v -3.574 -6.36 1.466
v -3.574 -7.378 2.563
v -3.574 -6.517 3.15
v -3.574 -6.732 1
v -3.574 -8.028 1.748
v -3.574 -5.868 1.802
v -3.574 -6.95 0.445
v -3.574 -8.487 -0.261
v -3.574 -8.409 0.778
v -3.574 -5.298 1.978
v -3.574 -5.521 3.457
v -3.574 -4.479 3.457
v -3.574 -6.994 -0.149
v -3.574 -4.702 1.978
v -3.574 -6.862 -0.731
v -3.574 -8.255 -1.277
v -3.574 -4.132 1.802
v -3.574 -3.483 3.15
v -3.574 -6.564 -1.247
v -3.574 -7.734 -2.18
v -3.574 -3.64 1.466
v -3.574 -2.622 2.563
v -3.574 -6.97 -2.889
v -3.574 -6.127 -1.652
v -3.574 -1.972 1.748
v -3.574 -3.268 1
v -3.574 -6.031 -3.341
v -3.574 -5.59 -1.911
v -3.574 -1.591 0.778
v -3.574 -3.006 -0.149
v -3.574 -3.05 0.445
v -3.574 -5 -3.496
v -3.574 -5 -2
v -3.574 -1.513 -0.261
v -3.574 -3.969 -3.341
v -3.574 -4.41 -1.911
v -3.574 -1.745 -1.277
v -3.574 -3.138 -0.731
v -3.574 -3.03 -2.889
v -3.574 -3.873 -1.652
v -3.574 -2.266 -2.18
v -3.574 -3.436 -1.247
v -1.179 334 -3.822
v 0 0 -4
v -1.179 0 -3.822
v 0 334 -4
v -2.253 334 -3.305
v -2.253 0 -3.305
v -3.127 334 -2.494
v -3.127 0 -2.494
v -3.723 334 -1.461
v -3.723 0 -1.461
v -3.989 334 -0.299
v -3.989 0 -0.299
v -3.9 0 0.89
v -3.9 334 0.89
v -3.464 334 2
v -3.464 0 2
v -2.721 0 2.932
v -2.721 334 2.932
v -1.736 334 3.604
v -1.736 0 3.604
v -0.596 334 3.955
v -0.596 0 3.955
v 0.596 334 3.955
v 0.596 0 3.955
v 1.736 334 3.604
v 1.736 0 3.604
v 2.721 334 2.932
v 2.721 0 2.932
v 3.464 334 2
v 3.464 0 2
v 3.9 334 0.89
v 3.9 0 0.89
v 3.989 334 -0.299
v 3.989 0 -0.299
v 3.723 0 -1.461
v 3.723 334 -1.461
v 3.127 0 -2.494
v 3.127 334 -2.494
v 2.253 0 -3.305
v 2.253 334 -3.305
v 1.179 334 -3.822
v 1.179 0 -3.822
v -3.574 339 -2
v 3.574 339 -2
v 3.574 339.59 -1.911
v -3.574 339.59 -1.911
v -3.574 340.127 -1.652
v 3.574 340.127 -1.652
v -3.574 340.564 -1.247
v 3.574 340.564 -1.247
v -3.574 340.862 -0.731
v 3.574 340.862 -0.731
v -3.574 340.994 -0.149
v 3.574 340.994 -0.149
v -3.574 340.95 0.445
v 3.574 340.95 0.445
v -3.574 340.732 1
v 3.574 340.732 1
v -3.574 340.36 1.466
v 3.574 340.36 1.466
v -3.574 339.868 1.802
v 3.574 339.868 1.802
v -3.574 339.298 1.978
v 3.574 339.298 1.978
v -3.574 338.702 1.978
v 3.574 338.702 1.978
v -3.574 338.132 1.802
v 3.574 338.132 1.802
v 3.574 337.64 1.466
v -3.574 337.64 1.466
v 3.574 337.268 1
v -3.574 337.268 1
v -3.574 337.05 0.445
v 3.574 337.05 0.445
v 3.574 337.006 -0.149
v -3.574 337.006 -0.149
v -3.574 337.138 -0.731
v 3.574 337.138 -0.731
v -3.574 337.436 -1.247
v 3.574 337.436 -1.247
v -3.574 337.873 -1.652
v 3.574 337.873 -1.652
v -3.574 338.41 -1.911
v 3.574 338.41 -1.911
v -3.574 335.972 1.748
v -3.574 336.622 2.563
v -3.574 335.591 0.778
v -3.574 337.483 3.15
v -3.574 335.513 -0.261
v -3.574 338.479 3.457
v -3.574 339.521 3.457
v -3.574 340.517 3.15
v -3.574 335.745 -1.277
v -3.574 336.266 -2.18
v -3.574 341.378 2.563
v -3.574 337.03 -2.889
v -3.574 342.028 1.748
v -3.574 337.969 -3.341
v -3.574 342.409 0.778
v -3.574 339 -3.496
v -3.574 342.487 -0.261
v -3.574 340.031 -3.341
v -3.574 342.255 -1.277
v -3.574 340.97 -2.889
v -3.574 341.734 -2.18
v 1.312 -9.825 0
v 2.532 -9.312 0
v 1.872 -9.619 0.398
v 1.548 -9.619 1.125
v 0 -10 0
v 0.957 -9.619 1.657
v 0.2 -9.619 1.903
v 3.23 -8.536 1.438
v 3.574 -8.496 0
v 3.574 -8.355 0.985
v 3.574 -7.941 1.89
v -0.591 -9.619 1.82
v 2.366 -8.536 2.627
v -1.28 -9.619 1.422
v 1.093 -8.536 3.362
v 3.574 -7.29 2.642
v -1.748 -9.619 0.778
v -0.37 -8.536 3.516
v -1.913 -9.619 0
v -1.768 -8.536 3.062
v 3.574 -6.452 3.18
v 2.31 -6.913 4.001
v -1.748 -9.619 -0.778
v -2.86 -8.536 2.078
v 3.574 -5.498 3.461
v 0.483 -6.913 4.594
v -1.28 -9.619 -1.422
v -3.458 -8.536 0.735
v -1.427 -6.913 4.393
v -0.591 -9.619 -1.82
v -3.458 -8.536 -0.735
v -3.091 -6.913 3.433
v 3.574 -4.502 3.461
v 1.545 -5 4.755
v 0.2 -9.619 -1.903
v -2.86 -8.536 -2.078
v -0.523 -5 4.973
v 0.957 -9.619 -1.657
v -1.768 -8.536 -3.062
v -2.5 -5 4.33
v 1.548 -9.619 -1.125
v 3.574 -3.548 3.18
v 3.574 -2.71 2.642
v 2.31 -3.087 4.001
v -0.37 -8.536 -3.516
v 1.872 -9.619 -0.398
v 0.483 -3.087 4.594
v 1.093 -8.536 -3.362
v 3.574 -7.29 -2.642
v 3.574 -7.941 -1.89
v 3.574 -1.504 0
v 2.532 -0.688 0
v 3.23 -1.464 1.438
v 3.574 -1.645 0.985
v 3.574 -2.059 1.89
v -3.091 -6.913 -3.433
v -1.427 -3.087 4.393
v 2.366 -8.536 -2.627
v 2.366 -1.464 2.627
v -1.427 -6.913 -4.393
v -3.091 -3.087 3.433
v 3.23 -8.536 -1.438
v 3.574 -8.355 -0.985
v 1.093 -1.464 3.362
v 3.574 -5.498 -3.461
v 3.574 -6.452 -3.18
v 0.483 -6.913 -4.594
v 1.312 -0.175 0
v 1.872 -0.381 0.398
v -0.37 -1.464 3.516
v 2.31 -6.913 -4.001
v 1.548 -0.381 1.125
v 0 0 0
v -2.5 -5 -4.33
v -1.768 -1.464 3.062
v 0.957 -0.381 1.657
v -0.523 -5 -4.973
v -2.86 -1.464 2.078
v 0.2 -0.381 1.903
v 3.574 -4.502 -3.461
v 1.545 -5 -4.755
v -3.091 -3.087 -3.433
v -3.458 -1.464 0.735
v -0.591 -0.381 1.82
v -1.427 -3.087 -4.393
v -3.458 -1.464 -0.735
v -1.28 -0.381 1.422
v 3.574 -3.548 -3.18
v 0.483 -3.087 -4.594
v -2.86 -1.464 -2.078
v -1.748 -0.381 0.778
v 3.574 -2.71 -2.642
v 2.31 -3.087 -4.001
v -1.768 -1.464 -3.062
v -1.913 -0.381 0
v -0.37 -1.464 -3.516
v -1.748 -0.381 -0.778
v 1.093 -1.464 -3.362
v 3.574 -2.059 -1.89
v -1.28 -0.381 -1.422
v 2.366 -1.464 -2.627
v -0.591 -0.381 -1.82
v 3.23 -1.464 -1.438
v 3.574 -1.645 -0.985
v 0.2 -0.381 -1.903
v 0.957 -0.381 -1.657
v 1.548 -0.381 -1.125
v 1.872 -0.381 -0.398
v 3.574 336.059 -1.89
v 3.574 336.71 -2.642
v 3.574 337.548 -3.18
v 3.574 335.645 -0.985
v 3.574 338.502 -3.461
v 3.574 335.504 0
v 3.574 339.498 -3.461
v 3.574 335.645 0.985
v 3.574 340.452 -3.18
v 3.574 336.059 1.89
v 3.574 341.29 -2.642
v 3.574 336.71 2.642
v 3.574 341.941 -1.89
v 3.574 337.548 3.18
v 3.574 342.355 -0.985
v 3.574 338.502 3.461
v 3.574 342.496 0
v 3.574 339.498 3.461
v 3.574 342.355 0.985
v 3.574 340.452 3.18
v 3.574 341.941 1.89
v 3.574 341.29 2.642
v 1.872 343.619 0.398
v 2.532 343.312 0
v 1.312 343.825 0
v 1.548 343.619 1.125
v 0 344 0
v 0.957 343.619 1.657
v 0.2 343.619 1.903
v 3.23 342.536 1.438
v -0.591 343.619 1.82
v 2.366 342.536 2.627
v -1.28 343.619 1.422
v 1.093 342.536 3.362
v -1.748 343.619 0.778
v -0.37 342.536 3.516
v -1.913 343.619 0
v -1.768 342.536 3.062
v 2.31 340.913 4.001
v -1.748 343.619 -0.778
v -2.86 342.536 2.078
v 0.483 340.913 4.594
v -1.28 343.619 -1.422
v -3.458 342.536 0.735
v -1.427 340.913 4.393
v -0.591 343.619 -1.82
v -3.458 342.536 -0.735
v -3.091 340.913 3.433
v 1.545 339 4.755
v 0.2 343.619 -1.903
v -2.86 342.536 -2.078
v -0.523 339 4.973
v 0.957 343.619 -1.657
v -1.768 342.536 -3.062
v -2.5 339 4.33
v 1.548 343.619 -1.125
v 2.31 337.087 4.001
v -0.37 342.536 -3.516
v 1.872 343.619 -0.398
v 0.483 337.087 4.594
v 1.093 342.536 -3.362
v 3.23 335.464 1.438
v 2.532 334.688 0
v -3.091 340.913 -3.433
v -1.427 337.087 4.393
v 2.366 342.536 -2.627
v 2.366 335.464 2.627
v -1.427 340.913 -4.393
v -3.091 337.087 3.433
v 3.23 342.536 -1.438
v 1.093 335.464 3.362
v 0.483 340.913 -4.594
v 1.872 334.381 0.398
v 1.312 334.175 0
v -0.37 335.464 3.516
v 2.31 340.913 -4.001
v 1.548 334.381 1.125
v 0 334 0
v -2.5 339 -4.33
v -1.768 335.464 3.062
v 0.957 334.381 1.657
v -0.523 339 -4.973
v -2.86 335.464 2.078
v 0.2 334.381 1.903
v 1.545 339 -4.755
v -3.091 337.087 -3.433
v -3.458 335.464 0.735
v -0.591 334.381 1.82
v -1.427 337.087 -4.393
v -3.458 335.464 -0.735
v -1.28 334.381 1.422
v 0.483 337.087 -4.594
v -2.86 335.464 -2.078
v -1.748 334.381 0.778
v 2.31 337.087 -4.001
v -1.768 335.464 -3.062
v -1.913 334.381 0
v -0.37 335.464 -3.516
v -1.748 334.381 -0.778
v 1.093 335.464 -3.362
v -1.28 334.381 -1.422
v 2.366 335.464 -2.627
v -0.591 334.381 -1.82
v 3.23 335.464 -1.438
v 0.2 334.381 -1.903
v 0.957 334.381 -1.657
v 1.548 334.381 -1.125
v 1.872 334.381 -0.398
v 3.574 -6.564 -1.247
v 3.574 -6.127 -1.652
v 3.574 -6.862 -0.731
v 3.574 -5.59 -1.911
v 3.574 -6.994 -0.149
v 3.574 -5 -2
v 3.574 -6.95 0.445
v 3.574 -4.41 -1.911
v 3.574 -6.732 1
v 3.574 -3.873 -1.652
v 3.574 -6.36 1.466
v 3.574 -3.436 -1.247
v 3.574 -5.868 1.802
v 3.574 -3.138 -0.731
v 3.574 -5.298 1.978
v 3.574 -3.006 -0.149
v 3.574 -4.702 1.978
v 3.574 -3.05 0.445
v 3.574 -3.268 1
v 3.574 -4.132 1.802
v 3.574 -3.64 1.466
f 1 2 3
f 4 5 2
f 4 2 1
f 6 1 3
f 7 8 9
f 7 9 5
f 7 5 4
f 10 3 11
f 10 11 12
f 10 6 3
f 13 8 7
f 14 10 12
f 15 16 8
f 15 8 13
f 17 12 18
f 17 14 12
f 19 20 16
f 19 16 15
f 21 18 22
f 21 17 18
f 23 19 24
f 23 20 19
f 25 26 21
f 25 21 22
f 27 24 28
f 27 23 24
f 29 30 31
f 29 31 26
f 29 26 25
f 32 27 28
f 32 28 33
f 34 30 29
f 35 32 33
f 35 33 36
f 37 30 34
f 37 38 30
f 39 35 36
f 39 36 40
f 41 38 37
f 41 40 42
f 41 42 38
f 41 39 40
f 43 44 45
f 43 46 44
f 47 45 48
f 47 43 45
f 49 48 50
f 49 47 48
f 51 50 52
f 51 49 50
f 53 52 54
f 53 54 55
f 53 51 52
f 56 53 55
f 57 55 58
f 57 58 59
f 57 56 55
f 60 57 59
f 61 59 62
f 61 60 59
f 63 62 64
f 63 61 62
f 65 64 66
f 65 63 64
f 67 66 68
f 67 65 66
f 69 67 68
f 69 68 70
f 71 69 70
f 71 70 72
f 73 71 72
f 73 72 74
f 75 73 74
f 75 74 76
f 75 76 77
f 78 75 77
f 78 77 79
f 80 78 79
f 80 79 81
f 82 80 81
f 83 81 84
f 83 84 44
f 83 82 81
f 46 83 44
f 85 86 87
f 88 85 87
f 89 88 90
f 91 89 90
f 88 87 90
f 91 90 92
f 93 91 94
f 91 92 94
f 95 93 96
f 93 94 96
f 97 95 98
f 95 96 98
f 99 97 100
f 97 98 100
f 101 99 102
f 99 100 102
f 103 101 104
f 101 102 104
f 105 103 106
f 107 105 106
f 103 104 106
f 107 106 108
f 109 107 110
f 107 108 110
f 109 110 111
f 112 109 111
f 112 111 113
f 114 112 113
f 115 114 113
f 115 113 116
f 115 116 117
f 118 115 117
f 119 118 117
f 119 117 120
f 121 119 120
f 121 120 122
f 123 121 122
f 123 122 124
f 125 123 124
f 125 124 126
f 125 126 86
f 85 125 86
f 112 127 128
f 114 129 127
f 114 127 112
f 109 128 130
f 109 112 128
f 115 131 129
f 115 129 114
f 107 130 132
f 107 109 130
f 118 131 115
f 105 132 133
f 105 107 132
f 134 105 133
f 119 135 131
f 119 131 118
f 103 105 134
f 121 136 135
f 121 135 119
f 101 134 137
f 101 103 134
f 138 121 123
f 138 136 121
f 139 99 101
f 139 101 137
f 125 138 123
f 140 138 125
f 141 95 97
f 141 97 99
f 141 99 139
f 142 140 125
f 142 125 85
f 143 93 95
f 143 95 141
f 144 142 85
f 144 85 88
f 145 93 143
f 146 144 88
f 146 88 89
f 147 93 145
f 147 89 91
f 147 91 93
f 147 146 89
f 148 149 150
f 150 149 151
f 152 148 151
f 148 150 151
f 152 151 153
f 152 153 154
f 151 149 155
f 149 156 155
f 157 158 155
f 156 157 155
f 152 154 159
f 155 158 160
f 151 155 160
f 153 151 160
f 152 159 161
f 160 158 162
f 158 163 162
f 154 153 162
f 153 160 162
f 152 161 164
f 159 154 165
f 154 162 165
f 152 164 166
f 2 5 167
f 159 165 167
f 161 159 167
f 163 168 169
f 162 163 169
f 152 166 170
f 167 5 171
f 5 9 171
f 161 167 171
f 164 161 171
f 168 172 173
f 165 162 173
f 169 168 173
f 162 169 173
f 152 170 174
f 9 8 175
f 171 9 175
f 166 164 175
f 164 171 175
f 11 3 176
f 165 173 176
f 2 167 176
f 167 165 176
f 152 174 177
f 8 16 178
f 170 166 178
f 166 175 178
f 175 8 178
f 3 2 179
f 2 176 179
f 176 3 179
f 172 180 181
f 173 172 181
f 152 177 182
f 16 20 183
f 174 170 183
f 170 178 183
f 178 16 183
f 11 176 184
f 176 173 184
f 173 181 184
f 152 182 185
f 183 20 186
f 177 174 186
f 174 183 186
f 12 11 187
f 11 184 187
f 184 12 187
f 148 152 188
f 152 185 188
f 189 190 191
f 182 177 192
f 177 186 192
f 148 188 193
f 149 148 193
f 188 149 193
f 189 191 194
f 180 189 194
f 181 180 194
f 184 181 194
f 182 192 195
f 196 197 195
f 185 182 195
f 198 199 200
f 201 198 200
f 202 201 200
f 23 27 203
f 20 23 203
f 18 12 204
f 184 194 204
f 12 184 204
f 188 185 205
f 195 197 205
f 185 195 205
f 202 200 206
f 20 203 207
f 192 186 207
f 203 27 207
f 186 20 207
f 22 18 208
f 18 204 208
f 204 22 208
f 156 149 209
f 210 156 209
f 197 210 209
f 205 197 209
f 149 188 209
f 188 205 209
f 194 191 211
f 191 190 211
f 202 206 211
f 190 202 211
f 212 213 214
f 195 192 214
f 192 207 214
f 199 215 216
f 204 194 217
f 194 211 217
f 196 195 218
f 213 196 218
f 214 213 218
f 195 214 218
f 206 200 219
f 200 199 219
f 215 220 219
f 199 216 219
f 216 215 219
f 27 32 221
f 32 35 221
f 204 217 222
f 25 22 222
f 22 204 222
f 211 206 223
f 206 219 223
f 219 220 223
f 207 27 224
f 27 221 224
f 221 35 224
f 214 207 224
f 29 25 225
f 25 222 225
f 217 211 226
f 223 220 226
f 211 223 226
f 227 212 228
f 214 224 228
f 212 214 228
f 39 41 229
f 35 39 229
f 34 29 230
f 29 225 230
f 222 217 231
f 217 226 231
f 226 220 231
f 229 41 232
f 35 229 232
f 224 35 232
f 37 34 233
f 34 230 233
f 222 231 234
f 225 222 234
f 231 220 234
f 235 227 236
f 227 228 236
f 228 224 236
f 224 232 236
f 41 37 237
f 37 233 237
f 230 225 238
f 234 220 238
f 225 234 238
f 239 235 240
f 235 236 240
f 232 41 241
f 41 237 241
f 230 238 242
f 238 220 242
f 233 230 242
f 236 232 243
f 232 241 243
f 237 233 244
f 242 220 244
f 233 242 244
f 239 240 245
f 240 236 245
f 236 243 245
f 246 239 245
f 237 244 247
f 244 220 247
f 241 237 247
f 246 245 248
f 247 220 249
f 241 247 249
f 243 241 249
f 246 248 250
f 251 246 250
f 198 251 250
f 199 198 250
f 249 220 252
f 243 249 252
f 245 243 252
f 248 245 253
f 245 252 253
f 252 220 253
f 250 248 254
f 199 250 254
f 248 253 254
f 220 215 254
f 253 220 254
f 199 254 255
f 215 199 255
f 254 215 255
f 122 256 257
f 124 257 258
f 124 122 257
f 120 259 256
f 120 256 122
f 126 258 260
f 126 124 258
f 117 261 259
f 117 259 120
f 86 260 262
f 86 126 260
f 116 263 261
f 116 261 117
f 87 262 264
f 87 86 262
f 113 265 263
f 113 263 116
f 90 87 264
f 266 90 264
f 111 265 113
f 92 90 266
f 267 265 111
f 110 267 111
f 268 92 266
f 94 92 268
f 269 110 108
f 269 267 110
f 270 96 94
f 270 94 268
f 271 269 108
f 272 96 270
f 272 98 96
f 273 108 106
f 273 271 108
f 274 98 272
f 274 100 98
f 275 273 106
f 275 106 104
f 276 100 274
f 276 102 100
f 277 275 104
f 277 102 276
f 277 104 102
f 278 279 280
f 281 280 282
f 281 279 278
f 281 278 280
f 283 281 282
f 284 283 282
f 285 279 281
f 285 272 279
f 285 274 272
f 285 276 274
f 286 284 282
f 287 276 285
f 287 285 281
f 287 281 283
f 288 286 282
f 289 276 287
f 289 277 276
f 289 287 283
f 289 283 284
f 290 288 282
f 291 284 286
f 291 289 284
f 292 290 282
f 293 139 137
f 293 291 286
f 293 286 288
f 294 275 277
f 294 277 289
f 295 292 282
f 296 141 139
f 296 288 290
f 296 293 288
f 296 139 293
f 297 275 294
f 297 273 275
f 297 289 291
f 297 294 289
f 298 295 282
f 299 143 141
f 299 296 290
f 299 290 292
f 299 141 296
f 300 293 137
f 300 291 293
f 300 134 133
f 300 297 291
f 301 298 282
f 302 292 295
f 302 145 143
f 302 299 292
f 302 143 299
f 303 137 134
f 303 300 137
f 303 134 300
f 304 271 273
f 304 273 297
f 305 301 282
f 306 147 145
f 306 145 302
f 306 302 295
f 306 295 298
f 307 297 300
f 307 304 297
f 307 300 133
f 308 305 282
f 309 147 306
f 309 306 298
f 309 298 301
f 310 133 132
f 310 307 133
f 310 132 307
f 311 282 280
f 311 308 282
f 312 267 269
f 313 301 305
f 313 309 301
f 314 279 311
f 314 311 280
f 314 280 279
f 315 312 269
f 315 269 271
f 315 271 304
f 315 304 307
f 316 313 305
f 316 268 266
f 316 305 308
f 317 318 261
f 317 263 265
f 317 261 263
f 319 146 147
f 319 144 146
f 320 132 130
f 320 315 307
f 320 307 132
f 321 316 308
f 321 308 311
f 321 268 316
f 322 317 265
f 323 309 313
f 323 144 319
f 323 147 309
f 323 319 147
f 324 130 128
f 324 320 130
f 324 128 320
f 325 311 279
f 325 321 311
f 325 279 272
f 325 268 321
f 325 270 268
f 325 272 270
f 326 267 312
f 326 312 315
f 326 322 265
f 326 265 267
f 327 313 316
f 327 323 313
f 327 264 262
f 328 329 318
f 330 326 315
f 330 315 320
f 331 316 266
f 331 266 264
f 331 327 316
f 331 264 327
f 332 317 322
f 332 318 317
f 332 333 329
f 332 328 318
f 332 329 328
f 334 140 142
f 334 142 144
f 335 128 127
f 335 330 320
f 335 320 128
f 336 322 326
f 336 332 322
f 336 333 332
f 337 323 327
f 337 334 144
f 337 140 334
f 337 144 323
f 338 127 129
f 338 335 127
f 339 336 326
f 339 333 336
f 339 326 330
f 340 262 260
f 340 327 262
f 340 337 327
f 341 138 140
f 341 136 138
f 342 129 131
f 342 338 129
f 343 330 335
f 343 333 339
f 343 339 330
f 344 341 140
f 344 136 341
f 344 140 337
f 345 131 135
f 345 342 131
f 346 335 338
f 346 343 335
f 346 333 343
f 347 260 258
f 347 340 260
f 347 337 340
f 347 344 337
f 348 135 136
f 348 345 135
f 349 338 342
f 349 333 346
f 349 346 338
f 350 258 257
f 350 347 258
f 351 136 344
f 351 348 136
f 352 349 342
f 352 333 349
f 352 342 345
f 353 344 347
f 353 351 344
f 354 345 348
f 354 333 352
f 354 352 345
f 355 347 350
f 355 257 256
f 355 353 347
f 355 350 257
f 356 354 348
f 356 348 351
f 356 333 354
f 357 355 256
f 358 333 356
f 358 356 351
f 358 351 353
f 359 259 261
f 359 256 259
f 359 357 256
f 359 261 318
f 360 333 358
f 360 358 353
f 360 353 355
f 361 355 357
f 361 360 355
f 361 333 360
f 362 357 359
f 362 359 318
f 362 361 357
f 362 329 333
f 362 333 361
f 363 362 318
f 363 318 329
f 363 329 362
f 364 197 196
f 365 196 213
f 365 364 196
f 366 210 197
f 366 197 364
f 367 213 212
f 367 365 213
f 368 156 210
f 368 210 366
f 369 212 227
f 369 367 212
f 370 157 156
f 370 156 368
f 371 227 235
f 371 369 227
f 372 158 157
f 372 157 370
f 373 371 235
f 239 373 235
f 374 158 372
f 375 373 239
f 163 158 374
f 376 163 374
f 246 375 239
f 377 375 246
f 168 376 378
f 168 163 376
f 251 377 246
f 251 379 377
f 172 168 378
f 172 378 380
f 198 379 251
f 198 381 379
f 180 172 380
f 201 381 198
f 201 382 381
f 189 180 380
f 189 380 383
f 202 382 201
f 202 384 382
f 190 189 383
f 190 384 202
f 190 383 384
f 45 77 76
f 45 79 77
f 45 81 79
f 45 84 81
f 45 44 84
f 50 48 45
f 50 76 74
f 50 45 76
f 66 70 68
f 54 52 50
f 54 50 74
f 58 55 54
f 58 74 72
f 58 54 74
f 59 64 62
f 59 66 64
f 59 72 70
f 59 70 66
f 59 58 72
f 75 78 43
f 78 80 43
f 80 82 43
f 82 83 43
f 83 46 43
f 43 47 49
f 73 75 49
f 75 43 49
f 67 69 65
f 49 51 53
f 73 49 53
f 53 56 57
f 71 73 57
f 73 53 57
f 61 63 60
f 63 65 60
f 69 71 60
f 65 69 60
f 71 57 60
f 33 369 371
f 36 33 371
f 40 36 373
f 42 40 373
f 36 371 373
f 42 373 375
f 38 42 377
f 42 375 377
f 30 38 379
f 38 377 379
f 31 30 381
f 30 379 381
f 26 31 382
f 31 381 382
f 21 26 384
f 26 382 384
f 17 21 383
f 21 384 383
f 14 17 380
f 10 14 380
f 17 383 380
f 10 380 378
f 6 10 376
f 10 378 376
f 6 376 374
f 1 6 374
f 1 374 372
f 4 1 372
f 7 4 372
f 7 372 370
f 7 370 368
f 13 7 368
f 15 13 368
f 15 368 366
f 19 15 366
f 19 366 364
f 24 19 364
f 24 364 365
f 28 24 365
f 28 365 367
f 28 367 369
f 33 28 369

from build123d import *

# Parameters (mm, degrees)
SKETCH_1_W          = 4
SKETCH_1_H          = 334
SKETCH_3_W          = 5.137829835
SKETCH_3_H          = 13.006561537
CUT_EXTRUDE_1_DEPTH = 5
SKETCH_3_3_W        = 5.137829835
SKETCH_3_3_H        = 13.006561537
CUT_EXTRUDE_3_DEPTH = 5
SKETCH_4_R          = 2
CUT_EXTRUDE_4_DEPTH = 10


with BuildPart() as part:
    # 草圖1 → 旋轉1 (revolve)
    with BuildSketch(Plane.XY, mode=Mode.PRIVATE) as revolve_1_sk:
        with Locations((2, 167)):
            Rectangle(SKETCH_1_W, SKETCH_1_H)
    revolve(revolve_1_sk.sketch.rotate(Axis((0, 0, 0), (0, 1, 0)), 90), axis=Axis((0, 0, 0), (0, 1, 0)))


with BuildPart() as body_2:
    # 草圖2 → 旋轉2 (revolve)
    with BuildSketch(Plane.XY):
        with BuildLine():
            Line((0, 0), (0, -10))
            ThreePointArc((0, -10), (5, -5), (0, 0))
        make_face()
        with BuildLine():
            Line((0, 334), (0, 344))
            ThreePointArc((0, 344), (5, 339), (0, 334))
        make_face()
    revolve(axis=Axis((0, 347.589463941, 0), (0, -1, 0)))

    # 草圖3 → 除料-伸長1 (cut, symmetric)
    with BuildSketch(Plane.XY):
        with Locations((-6.143176149, 340.503280769)):
            Rectangle(SKETCH_3_W, SKETCH_3_H)
        with Locations((6.143176149, 340.503280769)):
            Rectangle(SKETCH_3_W, SKETCH_3_H)
    extrude(amount=CUT_EXTRUDE_1_DEPTH, both=True, mode=Mode.SUBTRACT)

    # 草圖3<3> → 除料-伸長3 (cut, symmetric)
    with BuildSketch(Plane.XY):
        with Locations((-6.143176149, 340.503280769)):
            Rectangle(SKETCH_3_3_W, SKETCH_3_3_H)
        with Locations((6.143176149, 340.503280769)):
            Rectangle(SKETCH_3_3_W, SKETCH_3_3_H)
        with Locations((-6.143176149, -6.503280769)):
            Rectangle(SKETCH_3_3_W, SKETCH_3_3_H)
        with Locations((6.143176149, -6.503280769)):
            Rectangle(SKETCH_3_3_W, SKETCH_3_3_H)
    extrude(amount=CUT_EXTRUDE_3_DEPTH, both=True, mode=Mode.SUBTRACT)

    # 草圖4 → 除料-伸長4 (cut)
    with BuildSketch(Plane(origin=(3.574261231, 0, 0), x_dir=(0, 0, -1), z_dir=(1, 0, 0))):
        with Locations((0, 339)):
            Circle(SKETCH_4_R)
        with Locations((0, -5)):
            Circle(SKETCH_4_R)
    extrude(amount=-CUT_EXTRUDE_4_DEPTH, mode=Mode.SUBTRACT)


solid = Compound([part.part, body_2.part])
